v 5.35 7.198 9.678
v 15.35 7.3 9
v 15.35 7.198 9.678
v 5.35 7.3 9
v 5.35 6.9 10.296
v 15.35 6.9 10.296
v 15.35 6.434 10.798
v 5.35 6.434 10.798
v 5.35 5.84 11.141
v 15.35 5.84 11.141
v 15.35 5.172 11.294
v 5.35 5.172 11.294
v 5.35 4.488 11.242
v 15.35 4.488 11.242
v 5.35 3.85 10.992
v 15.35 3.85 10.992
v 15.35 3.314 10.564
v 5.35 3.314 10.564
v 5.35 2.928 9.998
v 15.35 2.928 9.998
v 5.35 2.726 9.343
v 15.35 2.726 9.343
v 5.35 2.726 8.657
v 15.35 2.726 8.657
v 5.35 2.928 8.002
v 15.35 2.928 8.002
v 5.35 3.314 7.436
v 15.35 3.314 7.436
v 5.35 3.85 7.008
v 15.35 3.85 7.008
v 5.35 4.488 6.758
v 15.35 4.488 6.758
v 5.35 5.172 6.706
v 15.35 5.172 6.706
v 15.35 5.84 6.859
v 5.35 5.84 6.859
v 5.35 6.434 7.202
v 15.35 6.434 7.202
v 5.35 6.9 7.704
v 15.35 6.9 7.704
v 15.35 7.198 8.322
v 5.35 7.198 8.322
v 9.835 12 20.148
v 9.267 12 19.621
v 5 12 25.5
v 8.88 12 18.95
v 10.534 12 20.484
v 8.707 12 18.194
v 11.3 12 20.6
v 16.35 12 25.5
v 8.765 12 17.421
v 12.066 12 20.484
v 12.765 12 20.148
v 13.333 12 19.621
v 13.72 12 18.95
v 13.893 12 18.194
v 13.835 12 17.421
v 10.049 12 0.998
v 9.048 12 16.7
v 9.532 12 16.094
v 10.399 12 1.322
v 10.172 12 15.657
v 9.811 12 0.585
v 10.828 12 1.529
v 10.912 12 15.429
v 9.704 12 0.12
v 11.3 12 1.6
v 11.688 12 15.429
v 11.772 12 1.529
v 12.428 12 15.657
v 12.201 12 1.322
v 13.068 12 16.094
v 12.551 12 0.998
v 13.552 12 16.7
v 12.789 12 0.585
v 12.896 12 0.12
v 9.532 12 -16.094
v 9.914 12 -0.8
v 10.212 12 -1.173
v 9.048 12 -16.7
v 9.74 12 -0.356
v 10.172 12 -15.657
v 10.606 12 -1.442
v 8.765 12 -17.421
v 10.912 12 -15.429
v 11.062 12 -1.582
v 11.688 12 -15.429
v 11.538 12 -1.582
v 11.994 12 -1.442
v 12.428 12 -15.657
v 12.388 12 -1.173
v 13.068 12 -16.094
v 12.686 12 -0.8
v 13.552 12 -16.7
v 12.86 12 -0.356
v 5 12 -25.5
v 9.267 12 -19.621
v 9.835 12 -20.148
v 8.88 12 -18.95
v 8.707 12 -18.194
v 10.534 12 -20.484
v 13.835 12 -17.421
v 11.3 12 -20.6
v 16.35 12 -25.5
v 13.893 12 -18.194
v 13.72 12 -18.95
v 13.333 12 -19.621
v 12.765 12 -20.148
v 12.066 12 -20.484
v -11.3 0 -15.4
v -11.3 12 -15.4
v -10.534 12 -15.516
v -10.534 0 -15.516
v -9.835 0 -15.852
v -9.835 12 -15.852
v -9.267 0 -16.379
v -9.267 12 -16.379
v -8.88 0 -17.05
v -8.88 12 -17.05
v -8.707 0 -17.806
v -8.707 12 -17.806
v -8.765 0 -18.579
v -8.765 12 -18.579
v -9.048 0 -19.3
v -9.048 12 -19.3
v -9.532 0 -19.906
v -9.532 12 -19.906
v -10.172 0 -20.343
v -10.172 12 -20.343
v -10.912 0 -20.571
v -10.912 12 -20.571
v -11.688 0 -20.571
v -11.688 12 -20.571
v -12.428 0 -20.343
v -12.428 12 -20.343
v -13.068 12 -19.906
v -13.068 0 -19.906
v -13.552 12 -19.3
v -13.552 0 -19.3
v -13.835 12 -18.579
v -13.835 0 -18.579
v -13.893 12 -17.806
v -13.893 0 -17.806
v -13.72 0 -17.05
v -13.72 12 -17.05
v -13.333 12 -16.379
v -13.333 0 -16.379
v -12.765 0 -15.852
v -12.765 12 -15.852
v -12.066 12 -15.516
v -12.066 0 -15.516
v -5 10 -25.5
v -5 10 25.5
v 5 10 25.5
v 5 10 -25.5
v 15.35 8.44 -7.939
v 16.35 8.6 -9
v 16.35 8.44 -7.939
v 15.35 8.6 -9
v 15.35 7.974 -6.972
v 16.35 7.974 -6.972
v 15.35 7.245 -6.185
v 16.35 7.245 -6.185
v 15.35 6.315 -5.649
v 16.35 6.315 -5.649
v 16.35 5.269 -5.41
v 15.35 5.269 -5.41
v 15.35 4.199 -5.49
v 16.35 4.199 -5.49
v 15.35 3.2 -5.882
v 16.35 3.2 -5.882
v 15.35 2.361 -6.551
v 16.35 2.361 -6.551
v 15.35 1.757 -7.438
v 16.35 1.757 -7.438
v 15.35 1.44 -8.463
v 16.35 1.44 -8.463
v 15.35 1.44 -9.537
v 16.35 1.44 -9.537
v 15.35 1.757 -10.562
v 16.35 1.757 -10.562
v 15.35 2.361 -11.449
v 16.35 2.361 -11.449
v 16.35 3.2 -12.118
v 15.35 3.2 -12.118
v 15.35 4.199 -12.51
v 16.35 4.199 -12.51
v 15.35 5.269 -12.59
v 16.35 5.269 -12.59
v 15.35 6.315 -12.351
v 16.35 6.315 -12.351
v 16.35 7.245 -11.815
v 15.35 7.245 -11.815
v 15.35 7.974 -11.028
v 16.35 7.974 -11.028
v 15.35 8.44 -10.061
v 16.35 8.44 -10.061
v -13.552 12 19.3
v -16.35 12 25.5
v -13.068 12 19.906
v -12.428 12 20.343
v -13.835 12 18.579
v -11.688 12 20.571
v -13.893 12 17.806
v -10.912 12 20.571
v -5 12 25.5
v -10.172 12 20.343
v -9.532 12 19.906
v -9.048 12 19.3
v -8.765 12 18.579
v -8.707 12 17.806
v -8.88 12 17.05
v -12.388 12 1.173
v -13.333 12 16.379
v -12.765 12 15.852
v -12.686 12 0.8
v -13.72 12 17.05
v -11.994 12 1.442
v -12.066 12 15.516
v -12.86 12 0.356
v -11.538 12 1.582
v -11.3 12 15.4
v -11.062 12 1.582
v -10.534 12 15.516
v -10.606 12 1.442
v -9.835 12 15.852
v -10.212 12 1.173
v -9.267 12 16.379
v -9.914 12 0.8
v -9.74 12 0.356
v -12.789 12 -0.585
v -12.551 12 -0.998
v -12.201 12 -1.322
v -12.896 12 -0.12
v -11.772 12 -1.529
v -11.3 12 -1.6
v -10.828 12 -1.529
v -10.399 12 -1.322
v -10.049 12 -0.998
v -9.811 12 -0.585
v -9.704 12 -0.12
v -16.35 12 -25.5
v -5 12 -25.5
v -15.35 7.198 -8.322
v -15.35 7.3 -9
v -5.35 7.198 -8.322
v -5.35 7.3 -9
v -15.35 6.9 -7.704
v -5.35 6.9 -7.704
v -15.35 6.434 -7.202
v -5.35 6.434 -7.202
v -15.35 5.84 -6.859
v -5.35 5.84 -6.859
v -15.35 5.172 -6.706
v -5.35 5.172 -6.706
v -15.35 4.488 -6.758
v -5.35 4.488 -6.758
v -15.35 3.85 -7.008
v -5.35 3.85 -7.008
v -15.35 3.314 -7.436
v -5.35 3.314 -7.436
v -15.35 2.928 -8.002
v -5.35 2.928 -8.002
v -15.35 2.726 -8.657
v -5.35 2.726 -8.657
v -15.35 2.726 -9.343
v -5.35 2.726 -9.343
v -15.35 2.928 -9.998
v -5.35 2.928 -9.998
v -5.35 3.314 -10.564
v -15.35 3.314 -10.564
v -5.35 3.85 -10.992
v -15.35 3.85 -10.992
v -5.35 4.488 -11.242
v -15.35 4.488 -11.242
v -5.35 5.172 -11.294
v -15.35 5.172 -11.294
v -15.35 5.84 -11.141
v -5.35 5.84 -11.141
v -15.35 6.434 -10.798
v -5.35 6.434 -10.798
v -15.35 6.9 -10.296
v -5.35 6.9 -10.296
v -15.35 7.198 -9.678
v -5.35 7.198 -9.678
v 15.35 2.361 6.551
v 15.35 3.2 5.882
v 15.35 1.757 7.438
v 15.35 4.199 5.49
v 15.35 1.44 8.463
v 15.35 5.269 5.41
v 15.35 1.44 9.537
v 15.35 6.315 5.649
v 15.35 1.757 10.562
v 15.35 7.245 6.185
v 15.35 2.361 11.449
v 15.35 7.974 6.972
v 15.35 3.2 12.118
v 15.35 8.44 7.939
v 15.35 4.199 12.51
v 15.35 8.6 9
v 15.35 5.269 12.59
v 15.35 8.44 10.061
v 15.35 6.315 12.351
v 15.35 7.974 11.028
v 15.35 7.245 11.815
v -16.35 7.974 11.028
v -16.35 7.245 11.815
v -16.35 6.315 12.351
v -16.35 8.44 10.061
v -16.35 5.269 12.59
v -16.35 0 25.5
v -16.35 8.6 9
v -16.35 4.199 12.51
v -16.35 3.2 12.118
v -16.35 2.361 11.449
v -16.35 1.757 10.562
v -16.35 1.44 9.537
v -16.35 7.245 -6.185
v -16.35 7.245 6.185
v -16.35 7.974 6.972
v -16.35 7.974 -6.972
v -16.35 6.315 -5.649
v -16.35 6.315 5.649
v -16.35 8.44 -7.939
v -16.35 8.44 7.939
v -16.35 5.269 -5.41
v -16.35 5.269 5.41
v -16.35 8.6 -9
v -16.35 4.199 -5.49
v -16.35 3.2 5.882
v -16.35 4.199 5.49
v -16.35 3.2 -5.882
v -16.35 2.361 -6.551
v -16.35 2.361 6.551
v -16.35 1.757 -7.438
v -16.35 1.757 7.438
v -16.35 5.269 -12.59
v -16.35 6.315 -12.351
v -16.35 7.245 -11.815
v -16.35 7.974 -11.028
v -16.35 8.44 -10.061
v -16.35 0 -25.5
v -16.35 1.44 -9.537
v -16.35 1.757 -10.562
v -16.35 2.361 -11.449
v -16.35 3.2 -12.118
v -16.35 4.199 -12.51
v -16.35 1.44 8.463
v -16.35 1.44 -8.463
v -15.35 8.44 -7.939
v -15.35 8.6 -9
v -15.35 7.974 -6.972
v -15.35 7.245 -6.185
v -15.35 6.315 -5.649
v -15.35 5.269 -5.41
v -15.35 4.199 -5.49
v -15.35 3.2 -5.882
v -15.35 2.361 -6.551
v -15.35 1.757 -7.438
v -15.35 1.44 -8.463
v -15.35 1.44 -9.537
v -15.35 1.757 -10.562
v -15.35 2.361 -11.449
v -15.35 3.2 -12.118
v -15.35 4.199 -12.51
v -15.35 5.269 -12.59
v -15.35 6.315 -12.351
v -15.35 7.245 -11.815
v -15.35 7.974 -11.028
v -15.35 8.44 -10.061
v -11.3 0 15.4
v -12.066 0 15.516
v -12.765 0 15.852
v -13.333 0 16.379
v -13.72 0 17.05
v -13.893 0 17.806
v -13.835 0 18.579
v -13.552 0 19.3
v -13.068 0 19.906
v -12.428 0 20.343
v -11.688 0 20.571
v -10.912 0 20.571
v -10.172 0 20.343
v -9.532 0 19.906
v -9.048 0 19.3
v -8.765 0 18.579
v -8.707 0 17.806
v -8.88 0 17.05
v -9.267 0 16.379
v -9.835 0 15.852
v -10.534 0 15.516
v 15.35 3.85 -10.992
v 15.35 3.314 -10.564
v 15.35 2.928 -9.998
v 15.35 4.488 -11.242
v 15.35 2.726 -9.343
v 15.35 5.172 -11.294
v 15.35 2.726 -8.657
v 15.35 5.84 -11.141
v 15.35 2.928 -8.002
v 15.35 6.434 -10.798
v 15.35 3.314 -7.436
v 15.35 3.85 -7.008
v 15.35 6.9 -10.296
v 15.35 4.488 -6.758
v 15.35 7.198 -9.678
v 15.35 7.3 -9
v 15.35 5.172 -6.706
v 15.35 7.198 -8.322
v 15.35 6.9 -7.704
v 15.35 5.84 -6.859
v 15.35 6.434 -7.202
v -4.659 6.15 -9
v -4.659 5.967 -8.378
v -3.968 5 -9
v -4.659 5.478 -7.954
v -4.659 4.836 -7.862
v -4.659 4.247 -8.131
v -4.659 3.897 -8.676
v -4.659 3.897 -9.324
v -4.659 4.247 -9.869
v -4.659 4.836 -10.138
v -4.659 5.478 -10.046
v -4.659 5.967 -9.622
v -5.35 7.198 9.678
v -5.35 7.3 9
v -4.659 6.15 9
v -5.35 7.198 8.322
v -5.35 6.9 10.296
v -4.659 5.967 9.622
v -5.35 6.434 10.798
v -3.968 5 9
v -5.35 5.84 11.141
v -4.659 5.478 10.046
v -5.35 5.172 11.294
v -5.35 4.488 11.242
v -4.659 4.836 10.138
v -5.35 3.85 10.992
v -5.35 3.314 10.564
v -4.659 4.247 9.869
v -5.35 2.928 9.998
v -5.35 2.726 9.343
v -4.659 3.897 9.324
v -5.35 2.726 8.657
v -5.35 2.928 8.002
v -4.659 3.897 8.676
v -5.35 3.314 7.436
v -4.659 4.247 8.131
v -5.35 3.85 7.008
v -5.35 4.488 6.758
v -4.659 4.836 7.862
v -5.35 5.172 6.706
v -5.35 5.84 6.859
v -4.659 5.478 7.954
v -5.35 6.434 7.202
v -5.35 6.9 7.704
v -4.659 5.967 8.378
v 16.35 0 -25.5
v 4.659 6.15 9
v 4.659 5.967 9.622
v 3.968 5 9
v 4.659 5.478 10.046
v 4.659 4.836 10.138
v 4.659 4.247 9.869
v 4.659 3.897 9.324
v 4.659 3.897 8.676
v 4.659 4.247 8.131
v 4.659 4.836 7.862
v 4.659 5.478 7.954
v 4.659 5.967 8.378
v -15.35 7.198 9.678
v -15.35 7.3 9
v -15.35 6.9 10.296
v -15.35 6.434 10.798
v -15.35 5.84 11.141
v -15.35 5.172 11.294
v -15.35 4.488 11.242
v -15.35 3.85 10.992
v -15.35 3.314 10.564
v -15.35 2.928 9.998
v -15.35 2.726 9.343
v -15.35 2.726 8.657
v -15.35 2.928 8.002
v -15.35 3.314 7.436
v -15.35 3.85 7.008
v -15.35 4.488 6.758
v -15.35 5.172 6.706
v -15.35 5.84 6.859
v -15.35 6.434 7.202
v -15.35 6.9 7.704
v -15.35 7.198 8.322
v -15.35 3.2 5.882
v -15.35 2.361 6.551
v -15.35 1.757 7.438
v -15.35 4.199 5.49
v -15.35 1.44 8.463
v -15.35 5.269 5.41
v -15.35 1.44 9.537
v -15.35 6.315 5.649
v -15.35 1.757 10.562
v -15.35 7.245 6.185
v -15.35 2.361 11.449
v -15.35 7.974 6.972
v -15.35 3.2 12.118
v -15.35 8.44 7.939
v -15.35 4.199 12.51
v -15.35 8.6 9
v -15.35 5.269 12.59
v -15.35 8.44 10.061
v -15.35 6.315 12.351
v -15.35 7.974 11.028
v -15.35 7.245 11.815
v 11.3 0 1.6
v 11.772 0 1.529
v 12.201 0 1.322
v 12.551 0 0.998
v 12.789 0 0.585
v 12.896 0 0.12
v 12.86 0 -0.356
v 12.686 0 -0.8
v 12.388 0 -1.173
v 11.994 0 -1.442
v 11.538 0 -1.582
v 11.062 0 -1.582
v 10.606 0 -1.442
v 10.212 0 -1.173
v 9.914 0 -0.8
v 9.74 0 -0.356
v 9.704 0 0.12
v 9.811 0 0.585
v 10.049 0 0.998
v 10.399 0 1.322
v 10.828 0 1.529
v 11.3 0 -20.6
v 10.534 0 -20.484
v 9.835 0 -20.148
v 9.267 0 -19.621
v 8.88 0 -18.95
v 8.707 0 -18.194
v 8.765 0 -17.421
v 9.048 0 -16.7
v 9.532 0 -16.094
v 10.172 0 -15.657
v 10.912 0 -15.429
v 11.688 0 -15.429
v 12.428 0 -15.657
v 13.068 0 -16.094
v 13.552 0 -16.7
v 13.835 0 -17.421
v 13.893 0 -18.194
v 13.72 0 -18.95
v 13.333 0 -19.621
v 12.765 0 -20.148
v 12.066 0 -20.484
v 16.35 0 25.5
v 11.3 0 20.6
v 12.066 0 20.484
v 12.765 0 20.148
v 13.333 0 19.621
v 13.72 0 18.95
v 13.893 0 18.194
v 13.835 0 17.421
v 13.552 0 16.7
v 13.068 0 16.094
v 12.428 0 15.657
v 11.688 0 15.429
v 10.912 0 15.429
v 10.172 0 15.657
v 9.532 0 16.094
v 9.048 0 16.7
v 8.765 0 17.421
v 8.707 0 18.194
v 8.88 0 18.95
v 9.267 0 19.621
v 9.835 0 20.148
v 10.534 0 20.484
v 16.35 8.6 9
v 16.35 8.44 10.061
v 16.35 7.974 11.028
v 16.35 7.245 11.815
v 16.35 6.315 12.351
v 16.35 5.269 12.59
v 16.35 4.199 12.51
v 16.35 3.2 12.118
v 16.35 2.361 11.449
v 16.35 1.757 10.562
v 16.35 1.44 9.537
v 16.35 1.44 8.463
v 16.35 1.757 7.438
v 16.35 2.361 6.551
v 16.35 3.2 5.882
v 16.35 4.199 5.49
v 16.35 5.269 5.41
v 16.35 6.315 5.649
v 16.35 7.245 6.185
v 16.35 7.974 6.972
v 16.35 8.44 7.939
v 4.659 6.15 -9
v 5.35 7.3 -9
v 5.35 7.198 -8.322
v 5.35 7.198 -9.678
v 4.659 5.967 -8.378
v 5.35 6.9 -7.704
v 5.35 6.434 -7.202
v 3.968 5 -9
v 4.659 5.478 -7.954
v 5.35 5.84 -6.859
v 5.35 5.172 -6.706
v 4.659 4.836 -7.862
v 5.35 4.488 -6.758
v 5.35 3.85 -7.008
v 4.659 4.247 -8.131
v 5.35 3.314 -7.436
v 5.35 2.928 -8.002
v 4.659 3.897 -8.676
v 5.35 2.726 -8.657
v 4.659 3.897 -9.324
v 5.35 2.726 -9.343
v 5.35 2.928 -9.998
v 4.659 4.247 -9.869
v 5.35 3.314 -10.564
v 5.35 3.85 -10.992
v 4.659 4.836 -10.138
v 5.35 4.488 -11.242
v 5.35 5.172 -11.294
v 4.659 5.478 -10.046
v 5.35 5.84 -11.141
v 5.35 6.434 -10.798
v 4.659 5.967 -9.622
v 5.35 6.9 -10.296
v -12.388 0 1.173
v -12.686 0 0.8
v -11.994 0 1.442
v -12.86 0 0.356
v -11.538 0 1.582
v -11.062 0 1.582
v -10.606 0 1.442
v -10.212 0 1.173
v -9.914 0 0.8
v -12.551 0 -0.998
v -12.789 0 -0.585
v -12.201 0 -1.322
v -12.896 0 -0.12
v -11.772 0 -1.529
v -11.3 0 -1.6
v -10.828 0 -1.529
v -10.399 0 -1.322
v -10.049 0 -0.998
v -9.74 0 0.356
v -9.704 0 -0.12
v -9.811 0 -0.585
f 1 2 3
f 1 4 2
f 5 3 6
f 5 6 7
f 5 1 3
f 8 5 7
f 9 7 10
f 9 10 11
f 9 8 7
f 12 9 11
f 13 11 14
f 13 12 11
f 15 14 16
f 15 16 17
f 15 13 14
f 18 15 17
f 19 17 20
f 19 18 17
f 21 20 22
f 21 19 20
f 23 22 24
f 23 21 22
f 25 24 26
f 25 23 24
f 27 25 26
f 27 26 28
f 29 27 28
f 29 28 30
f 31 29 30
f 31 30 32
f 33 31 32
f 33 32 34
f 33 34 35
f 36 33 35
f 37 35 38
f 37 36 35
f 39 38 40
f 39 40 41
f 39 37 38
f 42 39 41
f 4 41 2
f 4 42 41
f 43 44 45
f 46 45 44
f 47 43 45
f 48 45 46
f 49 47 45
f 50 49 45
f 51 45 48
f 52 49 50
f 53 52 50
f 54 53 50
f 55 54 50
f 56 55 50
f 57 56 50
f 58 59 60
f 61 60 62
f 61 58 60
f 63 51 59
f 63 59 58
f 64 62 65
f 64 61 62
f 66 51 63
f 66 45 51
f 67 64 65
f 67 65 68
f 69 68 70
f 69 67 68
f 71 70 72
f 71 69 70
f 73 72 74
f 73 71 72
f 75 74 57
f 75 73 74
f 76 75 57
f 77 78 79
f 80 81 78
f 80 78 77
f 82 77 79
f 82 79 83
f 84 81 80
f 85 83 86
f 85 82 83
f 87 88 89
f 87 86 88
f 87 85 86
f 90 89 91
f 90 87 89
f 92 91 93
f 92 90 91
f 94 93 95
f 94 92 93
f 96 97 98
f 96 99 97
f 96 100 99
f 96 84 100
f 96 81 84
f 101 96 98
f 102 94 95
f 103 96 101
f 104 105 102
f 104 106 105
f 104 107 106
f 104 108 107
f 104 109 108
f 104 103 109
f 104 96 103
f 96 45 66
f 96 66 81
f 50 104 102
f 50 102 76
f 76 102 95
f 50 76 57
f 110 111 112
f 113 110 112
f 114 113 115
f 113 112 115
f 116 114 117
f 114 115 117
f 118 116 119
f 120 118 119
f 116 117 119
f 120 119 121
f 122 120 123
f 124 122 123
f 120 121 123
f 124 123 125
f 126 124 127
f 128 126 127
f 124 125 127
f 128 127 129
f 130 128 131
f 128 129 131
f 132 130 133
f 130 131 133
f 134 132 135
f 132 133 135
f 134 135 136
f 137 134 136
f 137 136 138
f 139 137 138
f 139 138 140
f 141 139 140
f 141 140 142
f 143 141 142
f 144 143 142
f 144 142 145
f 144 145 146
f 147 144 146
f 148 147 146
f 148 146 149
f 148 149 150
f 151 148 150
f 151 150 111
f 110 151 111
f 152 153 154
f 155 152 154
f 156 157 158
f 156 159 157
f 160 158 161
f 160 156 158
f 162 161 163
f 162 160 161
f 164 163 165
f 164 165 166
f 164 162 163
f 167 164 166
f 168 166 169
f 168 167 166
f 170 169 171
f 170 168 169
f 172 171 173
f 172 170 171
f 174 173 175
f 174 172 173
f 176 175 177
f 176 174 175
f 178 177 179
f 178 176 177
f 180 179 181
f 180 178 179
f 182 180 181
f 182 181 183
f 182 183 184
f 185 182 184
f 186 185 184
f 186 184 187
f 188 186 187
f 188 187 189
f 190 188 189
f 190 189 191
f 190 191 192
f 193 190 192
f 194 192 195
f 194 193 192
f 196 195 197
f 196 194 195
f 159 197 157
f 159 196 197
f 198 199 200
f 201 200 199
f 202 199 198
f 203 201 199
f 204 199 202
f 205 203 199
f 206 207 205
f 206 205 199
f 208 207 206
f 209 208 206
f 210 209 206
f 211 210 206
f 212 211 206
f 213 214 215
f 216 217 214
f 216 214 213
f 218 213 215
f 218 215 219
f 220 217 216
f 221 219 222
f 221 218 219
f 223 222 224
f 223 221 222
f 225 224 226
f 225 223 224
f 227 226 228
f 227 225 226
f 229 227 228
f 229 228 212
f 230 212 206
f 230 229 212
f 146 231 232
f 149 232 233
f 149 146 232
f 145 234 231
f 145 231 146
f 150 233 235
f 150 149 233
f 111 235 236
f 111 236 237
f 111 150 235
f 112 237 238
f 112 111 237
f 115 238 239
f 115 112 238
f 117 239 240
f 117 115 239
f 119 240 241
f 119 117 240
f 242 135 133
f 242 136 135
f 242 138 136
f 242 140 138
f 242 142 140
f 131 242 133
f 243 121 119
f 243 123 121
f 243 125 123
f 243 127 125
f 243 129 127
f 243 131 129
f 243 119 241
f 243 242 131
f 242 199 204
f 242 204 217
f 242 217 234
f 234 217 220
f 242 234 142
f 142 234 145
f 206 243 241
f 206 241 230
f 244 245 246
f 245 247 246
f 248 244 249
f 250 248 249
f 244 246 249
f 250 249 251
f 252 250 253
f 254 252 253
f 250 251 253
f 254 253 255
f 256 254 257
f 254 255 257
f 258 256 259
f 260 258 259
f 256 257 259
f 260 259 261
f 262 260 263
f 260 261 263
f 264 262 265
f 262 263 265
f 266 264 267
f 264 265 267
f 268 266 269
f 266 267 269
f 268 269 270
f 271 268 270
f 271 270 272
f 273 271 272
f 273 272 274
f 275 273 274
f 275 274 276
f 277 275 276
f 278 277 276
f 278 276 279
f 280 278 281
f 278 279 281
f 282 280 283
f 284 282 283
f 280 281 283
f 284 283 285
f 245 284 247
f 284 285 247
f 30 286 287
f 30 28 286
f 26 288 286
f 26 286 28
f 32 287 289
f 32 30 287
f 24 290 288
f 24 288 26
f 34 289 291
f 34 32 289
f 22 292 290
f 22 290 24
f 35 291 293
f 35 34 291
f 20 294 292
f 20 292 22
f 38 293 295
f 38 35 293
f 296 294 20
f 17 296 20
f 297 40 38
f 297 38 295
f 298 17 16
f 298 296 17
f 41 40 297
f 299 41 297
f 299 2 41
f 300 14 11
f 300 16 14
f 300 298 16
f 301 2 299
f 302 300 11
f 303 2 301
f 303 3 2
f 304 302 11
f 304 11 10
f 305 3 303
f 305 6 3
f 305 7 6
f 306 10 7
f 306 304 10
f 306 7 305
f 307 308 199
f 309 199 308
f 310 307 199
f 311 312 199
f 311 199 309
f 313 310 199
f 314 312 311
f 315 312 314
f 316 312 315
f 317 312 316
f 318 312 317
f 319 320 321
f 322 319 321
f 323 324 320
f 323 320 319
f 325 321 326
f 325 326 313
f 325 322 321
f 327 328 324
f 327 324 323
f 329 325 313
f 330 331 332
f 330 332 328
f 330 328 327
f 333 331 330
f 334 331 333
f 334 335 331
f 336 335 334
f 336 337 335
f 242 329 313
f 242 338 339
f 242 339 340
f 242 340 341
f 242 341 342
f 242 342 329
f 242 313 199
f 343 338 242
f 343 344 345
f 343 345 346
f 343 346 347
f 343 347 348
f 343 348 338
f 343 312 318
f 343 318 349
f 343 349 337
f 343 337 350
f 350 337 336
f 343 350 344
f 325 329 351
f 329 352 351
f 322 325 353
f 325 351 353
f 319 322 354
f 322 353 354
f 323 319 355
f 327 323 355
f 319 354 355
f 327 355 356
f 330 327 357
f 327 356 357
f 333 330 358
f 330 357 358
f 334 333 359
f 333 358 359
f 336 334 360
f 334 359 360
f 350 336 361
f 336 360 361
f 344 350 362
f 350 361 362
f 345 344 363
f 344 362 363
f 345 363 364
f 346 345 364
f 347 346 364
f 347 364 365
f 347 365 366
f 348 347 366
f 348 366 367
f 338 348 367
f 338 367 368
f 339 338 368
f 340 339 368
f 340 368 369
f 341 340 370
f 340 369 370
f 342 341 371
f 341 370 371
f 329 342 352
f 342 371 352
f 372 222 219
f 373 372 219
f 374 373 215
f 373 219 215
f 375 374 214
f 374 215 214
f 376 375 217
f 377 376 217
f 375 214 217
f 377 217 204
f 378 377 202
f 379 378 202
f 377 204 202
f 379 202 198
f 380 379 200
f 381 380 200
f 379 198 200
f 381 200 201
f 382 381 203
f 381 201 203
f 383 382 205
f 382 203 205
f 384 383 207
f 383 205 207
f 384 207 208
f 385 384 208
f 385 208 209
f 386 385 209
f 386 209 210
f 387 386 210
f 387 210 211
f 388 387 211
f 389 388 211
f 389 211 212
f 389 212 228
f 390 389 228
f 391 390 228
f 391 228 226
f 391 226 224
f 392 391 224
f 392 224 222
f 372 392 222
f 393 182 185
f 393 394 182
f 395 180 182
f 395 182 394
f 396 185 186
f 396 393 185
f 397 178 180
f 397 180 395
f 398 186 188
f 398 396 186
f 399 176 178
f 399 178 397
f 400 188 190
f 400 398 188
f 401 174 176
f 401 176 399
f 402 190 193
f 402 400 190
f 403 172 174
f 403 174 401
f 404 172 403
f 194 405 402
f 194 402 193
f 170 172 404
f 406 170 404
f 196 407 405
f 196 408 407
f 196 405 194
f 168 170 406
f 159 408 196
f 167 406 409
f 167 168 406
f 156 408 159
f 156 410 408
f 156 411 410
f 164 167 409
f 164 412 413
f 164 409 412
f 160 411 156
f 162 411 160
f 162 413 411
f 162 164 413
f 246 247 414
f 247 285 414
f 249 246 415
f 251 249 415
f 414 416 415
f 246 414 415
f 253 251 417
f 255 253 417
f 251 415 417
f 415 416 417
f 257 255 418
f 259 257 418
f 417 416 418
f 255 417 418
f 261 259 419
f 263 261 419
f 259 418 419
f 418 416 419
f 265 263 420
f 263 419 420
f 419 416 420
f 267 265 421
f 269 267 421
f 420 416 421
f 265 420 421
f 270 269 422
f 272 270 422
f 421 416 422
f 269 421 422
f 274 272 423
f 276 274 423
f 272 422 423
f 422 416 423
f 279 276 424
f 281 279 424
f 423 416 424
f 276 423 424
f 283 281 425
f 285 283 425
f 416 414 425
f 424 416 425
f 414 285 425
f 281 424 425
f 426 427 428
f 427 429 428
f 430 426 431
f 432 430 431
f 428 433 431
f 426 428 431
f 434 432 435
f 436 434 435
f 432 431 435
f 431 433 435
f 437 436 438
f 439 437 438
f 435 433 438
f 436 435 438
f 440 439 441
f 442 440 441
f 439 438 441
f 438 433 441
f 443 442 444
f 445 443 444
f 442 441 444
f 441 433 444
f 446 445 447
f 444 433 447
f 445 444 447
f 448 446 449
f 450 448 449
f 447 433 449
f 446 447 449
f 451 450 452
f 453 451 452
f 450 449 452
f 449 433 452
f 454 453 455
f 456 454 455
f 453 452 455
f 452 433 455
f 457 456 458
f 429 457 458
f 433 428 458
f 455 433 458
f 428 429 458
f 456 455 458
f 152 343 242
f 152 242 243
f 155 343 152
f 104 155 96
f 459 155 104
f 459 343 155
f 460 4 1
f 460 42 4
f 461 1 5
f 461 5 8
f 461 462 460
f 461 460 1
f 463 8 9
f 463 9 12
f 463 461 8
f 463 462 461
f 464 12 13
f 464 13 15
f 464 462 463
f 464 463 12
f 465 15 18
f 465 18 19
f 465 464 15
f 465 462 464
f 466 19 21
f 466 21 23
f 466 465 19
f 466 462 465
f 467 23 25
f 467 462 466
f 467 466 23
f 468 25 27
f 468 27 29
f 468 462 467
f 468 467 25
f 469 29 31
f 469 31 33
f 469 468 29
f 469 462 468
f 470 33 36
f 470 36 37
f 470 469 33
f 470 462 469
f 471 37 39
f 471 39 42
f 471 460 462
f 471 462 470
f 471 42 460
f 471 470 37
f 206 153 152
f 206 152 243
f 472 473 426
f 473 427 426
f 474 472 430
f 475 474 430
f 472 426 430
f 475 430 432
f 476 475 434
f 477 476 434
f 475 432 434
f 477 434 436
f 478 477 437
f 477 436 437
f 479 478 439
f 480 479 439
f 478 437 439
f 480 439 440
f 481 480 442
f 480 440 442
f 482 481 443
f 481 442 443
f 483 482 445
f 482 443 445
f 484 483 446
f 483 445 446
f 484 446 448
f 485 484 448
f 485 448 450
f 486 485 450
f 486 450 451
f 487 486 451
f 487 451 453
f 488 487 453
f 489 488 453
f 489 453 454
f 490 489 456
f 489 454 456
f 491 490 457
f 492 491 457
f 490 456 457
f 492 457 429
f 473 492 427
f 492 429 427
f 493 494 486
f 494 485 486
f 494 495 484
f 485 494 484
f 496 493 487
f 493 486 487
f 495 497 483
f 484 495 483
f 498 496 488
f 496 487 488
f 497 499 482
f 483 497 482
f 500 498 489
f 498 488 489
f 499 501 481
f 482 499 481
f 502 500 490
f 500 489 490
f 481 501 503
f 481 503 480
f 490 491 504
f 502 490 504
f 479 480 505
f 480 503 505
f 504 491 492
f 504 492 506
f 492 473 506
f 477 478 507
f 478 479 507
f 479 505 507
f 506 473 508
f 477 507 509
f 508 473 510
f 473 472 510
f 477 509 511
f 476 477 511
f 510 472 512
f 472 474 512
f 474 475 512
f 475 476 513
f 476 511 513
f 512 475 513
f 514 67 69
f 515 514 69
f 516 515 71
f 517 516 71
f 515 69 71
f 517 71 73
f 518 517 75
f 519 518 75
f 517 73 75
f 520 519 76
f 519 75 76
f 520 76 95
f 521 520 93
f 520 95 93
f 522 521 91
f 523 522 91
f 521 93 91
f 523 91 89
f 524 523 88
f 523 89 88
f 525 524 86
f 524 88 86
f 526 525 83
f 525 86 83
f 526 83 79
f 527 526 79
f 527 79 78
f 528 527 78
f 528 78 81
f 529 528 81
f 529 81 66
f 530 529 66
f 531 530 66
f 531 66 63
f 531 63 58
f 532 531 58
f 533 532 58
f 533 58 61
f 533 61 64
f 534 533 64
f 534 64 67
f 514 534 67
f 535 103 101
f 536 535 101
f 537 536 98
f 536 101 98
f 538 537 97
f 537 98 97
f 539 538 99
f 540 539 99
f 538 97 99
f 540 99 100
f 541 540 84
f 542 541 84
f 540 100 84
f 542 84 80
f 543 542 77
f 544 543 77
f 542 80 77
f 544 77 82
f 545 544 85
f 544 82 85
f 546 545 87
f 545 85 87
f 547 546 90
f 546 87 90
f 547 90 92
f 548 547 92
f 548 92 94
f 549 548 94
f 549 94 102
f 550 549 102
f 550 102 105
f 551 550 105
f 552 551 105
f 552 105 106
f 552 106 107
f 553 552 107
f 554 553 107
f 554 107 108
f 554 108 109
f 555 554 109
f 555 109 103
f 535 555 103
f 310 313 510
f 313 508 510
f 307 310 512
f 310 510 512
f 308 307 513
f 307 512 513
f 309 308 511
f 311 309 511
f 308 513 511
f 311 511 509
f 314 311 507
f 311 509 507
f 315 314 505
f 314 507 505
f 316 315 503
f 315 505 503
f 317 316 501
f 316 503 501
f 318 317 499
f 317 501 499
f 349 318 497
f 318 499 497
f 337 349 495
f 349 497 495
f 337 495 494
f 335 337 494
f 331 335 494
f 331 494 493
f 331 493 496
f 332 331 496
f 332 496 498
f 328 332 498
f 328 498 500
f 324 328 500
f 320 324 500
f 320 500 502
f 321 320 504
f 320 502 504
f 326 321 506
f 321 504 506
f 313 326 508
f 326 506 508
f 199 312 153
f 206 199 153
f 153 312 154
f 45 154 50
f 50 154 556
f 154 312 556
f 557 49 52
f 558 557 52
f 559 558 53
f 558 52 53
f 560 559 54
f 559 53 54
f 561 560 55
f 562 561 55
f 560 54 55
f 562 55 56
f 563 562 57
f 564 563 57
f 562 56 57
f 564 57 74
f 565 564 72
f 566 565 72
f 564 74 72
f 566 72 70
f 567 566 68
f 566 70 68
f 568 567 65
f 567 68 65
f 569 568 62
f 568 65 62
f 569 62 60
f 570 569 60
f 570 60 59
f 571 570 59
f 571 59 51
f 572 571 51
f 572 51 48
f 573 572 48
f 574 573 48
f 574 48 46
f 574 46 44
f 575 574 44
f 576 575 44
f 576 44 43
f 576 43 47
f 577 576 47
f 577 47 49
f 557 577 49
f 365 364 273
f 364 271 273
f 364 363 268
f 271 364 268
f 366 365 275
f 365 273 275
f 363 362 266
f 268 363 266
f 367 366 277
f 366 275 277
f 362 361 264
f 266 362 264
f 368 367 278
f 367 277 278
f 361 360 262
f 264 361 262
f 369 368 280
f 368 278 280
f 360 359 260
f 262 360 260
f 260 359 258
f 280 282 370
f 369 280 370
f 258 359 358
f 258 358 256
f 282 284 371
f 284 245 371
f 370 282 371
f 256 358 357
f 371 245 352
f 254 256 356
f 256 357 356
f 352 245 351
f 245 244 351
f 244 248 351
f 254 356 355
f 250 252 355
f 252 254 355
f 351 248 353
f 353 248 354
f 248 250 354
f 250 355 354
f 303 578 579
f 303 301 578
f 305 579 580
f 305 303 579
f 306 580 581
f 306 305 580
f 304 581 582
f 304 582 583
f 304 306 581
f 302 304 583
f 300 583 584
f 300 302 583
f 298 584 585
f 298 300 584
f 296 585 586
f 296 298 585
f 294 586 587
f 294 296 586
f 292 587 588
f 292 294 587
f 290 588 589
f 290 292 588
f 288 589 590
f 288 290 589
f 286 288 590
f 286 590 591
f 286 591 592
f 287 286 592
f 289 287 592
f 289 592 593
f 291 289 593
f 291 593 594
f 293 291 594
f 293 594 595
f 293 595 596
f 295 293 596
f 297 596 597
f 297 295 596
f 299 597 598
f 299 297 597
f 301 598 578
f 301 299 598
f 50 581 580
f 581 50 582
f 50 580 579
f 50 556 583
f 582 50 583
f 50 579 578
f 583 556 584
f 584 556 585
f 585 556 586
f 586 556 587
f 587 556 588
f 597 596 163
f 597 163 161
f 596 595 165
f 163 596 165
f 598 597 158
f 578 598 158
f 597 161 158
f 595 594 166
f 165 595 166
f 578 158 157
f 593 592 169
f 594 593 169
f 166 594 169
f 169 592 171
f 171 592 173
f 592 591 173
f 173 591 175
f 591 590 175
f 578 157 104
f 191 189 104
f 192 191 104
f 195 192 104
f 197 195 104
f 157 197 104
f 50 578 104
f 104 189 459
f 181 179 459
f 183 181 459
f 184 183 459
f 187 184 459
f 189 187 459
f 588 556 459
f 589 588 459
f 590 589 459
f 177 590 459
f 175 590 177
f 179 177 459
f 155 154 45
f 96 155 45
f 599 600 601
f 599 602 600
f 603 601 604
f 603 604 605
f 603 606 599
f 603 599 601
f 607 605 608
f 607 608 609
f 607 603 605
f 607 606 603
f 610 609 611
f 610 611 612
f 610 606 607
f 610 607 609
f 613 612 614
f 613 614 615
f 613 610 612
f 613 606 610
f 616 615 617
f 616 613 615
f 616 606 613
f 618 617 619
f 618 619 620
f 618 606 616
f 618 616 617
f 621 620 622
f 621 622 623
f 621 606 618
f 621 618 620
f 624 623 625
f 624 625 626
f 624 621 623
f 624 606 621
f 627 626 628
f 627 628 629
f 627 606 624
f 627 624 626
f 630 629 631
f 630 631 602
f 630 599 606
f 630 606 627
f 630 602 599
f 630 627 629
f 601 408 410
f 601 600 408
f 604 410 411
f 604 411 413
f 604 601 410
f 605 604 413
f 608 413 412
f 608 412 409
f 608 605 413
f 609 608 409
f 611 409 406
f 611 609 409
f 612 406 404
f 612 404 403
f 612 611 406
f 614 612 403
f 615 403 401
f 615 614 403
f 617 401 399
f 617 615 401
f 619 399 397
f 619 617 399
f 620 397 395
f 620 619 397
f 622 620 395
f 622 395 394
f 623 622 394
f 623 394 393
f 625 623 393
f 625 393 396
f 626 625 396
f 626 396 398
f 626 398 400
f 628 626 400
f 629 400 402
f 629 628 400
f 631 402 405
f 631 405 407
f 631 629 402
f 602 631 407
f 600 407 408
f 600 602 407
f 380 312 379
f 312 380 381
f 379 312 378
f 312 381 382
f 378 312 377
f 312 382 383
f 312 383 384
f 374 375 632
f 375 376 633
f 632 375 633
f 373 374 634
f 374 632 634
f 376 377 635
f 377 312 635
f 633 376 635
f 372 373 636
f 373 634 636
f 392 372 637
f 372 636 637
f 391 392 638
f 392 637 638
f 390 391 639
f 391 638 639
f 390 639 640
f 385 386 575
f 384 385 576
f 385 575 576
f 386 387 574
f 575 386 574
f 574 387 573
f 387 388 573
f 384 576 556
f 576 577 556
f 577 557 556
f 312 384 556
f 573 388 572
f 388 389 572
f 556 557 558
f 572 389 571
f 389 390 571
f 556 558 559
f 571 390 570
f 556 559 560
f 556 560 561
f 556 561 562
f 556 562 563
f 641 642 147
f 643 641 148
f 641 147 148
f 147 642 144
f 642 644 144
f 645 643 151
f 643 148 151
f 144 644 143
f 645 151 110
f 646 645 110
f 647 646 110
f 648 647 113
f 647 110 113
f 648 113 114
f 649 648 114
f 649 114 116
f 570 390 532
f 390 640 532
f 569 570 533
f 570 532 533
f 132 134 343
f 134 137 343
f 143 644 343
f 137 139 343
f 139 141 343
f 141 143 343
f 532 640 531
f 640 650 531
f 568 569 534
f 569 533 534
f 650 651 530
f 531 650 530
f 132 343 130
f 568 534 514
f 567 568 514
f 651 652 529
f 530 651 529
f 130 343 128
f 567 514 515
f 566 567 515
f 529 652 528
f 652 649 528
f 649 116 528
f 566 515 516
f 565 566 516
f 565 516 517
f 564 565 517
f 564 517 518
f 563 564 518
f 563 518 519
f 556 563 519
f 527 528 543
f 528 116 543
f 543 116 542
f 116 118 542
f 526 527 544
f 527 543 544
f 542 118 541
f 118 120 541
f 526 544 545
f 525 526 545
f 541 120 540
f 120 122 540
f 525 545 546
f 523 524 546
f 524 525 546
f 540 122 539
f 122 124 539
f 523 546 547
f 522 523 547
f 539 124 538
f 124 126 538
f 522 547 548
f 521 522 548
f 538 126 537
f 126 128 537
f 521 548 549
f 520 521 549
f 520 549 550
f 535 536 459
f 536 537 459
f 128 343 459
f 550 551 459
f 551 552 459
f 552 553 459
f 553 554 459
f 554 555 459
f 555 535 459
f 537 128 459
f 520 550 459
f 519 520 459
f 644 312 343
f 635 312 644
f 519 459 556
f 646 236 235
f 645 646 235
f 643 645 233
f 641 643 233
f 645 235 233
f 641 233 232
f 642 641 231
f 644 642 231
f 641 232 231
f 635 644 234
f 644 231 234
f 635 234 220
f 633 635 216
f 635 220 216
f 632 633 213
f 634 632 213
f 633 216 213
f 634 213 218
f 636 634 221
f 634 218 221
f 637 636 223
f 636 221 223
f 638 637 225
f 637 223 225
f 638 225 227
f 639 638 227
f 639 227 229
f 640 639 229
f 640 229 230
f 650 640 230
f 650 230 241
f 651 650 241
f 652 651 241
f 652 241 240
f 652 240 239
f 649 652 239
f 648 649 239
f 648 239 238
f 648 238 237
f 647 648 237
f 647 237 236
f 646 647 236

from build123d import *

# Parameters (mm, degrees)
SKETCH_1_W          = 32.7
SKETCH_1_H          = 51
EXTRUDE_1_DEPTH     = 12
SKETCH_2_R          = 2.6
SKETCH_2_R_2        = 1.6
CUT_EXTRUDE_1_DEPTH = 33.581781719
SKETCH_3_W          = 10
SKETCH_3_H          = 2
CUT_EXTRUDE_2_DEPTH = 55.884628996


# Read off the part's stored shape, not the designer's step: 高级异型孔1
with BuildPart() as part:
    # 草图1 → 凸台-拉伸1 (new body)
    with BuildSketch(Plane(origin=(0, 0, 0), x_dir=(1, 0, 0), z_dir=(0, 1, 0))):
        Rectangle(SKETCH_1_W, SKETCH_1_H)
    extrude(amount=EXTRUDE_1_DEPTH)

    # 草图2 → 切除-拉伸1 (cut, through all)
    with BuildSketch(Plane(origin=(0, 12, 0), x_dir=(1, 0, 0), z_dir=(0, 1, 0))):
        with Locations(Location((-11.3, 18, 0), (0, 0, 270))):
            Circle(SKETCH_2_R)
        with Locations(Location((11.3, 18, 0), (0, 0, 90))):
            Circle(SKETCH_2_R)
        with Locations(Location((11.3, -18, 0), (0, 0, 270))):
            Circle(SKETCH_2_R)
        with Locations(Location((-11.3, -18, 0), (0, 0, 90))):
            Circle(SKETCH_2_R)
        with Locations(Location((11.3, 0, 0), (0, 0, 270))):
            Circle(SKETCH_2_R_2)
        with Locations(Location((-11.3, 0, 0), (0, 0, 90))):
            Circle(SKETCH_2_R_2)
    extrude(amount=-CUT_EXTRUDE_1_DEPTH, mode=Mode.SUBTRACT)

    # 草图3 → 切除-拉伸2 (cut, through all)
    with BuildSketch(Plane.XY.offset(25.5)):
        with Locations((0, 11)):
            Rectangle(SKETCH_3_W, SKETCH_3_H)
    extrude(amount=-CUT_EXTRUDE_2_DEPTH, mode=Mode.SUBTRACT)

    # 高级异型孔1 outline → 高级异型孔1 (revolve, cut)
    with BuildSketch(Plane(origin=(0, 5, 9), x_dir=(0, 1, 0), z_dir=(0, 0, -1))):
        Polygon((3.6, -16.35), (3.6, -15.35), (2.3, -15.35), (2.3, -5.35), (0, -3.96802058), (0, -16.35), align=None)
    other_1 = revolve(axis=Axis((0, 5, 9), (1, 0, 0)), mode=Mode.SUBTRACT)

    # Other 1 2 outline → Other 1 2 (revolve, cut)
    with BuildSketch(Plane(origin=(0, 5, -9), x_dir=(0, 1, 0), z_dir=(0, 0, -1))):
        Polygon((0, -16.35), (3.6, -16.35), (3.6, -15.35), (2.3, -15.35), (2.3, -5.35), (0, -3.96802058), align=None)
    other_1_2 = revolve(axis=Axis((0, 5, -9), (1, 0, 0)), mode=Mode.SUBTRACT)

    # 镜向1: 高级异型孔1, Other 1 2 across plane
    add(other_1.mirror(Plane(origin=(0, 0, 0), x_dir=(0, 0, 1), z_dir=(1, 0, 0))), mode=Mode.SUBTRACT)
    add(other_1_2.mirror(Plane(origin=(0, 0, 0), x_dir=(0, 0, 1), z_dir=(1, 0, 0))), mode=Mode.SUBTRACT)


solid = part.part
